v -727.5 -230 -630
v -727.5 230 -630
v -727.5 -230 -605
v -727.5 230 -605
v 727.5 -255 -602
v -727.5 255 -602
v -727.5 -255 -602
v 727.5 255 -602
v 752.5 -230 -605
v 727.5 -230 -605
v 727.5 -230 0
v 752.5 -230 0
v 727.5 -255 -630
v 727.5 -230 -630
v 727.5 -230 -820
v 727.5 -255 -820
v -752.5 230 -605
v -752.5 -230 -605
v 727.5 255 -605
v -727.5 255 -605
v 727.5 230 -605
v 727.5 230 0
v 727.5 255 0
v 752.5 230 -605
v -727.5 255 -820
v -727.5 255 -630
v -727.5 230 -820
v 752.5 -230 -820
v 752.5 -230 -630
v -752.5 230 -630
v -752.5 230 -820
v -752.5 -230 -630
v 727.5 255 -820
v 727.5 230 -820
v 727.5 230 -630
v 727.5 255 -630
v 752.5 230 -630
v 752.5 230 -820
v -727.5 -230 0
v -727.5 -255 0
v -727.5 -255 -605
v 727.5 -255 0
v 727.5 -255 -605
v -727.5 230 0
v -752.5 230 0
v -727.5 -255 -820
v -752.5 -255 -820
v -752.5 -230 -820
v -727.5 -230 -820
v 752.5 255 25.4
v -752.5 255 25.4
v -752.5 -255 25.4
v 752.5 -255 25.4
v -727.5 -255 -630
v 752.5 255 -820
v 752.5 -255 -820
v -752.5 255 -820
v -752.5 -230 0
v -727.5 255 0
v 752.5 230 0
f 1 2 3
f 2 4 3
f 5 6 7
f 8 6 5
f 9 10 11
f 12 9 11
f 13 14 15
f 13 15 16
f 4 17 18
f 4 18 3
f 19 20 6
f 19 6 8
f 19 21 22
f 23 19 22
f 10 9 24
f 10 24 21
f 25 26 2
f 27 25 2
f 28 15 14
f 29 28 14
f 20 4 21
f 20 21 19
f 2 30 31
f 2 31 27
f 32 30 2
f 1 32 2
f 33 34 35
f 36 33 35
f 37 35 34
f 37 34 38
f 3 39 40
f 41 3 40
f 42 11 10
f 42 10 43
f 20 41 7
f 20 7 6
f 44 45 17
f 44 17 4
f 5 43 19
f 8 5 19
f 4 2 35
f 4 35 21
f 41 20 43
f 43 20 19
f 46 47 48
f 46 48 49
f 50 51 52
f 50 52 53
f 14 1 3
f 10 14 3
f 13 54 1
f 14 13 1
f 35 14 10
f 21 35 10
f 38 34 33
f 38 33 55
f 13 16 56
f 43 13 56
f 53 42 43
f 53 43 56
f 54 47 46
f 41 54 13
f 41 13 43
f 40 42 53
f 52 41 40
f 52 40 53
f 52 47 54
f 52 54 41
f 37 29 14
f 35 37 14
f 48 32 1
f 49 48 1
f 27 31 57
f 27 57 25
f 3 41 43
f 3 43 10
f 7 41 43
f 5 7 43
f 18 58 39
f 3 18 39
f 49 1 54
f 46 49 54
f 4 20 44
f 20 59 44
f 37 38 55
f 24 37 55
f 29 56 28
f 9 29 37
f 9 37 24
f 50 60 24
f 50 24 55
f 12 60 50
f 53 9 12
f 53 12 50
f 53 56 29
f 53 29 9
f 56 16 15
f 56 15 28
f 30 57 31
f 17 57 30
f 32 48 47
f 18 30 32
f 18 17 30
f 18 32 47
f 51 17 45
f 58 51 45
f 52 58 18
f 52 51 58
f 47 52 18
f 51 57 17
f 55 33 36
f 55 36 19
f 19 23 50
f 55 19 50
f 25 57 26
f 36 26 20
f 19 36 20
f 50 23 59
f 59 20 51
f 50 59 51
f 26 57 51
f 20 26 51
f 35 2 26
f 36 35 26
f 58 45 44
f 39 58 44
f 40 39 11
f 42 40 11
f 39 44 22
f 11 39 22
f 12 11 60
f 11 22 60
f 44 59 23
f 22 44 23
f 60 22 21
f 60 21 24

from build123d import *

# Parameters (mm, degrees)
F0_W      = 1505
F0_H      = 510
F1_DEPTH  = 25.4
F2_W      = 25
F2_H      = 25
F3_DEPTH  = 820
F4_W      = 25
F4_H      = 25
F5_DEPTH  = 460
F6_W      = 25
F6_H      = 25
F7_DEPTH  = 1455
F8_W      = 25
F8_H      = 25
F9_DEPTH  = 460
F10_W     = 25
F10_H     = 25
F11_DEPTH = 1455
F12_W     = 1455
F12_H     = 510
F13_DEPTH = 3


with BuildPart() as f1:
    # F0 (on Top) → F1 (new body)
    with BuildSketch(Plane.XY):
        Rectangle(F0_W, F0_H)
    extrude(amount=F1_DEPTH)

    # F2 (on face) → F3 (join)
    with BuildSketch(Plane(origin=(0, 0, 0), x_dir=(1, 0, 0), z_dir=(0, 0, -1))):
        with Locations((-740, 242.5)):
            Rectangle(F2_W, F2_H)
        with Locations((-740, -242.5)):
            Rectangle(F2_W, F2_H)
        with Locations((740, 242.5)):
            Rectangle(F2_W, F2_H)
        with Locations((740, -242.5)):
            Rectangle(F2_W, F2_H)
    extrude(amount=F3_DEPTH)

    # F4 (on face) → F5 (join, through all)
    with BuildSketch(Plane.XZ.offset(-230)):
        with Locations((-740, -617.5)):
            Rectangle(F4_W, F4_H)
    extrude(amount=F5_DEPTH)

    # F6 (on face) → F7 (join, through all)
    with BuildSketch(Plane.YZ.offset(-727.5)):
        with Locations((-242.5, -617.5)):
            Rectangle(F6_W, F6_H)
    extrude(amount=F7_DEPTH)

    # F8 (on face) → F9 (join, through all)
    with BuildSketch(Plane(origin=(0, -230, 0), x_dir=(-1, 0, 0), z_dir=(0, 1, 0))):
        with Locations((-740, -617.5)):
            Rectangle(F8_W, F8_H)
    extrude(amount=F9_DEPTH)

    # F10 (on face) → F11 (join, through all)
    with BuildSketch(Plane.YZ.offset(-727.5)):
        with Locations((242.5, -617.5)):
            Rectangle(F10_W, F10_H)
    extrude(amount=F11_DEPTH)


with BuildPart() as f13:
    # F12 (on face) → F13 (new body)
    with BuildSketch(Plane.XY.offset(-605)):
        Rectangle(F12_W, F12_H)
    extrude(amount=F13_DEPTH)


solid = Compound([f1.part, f13.part])
